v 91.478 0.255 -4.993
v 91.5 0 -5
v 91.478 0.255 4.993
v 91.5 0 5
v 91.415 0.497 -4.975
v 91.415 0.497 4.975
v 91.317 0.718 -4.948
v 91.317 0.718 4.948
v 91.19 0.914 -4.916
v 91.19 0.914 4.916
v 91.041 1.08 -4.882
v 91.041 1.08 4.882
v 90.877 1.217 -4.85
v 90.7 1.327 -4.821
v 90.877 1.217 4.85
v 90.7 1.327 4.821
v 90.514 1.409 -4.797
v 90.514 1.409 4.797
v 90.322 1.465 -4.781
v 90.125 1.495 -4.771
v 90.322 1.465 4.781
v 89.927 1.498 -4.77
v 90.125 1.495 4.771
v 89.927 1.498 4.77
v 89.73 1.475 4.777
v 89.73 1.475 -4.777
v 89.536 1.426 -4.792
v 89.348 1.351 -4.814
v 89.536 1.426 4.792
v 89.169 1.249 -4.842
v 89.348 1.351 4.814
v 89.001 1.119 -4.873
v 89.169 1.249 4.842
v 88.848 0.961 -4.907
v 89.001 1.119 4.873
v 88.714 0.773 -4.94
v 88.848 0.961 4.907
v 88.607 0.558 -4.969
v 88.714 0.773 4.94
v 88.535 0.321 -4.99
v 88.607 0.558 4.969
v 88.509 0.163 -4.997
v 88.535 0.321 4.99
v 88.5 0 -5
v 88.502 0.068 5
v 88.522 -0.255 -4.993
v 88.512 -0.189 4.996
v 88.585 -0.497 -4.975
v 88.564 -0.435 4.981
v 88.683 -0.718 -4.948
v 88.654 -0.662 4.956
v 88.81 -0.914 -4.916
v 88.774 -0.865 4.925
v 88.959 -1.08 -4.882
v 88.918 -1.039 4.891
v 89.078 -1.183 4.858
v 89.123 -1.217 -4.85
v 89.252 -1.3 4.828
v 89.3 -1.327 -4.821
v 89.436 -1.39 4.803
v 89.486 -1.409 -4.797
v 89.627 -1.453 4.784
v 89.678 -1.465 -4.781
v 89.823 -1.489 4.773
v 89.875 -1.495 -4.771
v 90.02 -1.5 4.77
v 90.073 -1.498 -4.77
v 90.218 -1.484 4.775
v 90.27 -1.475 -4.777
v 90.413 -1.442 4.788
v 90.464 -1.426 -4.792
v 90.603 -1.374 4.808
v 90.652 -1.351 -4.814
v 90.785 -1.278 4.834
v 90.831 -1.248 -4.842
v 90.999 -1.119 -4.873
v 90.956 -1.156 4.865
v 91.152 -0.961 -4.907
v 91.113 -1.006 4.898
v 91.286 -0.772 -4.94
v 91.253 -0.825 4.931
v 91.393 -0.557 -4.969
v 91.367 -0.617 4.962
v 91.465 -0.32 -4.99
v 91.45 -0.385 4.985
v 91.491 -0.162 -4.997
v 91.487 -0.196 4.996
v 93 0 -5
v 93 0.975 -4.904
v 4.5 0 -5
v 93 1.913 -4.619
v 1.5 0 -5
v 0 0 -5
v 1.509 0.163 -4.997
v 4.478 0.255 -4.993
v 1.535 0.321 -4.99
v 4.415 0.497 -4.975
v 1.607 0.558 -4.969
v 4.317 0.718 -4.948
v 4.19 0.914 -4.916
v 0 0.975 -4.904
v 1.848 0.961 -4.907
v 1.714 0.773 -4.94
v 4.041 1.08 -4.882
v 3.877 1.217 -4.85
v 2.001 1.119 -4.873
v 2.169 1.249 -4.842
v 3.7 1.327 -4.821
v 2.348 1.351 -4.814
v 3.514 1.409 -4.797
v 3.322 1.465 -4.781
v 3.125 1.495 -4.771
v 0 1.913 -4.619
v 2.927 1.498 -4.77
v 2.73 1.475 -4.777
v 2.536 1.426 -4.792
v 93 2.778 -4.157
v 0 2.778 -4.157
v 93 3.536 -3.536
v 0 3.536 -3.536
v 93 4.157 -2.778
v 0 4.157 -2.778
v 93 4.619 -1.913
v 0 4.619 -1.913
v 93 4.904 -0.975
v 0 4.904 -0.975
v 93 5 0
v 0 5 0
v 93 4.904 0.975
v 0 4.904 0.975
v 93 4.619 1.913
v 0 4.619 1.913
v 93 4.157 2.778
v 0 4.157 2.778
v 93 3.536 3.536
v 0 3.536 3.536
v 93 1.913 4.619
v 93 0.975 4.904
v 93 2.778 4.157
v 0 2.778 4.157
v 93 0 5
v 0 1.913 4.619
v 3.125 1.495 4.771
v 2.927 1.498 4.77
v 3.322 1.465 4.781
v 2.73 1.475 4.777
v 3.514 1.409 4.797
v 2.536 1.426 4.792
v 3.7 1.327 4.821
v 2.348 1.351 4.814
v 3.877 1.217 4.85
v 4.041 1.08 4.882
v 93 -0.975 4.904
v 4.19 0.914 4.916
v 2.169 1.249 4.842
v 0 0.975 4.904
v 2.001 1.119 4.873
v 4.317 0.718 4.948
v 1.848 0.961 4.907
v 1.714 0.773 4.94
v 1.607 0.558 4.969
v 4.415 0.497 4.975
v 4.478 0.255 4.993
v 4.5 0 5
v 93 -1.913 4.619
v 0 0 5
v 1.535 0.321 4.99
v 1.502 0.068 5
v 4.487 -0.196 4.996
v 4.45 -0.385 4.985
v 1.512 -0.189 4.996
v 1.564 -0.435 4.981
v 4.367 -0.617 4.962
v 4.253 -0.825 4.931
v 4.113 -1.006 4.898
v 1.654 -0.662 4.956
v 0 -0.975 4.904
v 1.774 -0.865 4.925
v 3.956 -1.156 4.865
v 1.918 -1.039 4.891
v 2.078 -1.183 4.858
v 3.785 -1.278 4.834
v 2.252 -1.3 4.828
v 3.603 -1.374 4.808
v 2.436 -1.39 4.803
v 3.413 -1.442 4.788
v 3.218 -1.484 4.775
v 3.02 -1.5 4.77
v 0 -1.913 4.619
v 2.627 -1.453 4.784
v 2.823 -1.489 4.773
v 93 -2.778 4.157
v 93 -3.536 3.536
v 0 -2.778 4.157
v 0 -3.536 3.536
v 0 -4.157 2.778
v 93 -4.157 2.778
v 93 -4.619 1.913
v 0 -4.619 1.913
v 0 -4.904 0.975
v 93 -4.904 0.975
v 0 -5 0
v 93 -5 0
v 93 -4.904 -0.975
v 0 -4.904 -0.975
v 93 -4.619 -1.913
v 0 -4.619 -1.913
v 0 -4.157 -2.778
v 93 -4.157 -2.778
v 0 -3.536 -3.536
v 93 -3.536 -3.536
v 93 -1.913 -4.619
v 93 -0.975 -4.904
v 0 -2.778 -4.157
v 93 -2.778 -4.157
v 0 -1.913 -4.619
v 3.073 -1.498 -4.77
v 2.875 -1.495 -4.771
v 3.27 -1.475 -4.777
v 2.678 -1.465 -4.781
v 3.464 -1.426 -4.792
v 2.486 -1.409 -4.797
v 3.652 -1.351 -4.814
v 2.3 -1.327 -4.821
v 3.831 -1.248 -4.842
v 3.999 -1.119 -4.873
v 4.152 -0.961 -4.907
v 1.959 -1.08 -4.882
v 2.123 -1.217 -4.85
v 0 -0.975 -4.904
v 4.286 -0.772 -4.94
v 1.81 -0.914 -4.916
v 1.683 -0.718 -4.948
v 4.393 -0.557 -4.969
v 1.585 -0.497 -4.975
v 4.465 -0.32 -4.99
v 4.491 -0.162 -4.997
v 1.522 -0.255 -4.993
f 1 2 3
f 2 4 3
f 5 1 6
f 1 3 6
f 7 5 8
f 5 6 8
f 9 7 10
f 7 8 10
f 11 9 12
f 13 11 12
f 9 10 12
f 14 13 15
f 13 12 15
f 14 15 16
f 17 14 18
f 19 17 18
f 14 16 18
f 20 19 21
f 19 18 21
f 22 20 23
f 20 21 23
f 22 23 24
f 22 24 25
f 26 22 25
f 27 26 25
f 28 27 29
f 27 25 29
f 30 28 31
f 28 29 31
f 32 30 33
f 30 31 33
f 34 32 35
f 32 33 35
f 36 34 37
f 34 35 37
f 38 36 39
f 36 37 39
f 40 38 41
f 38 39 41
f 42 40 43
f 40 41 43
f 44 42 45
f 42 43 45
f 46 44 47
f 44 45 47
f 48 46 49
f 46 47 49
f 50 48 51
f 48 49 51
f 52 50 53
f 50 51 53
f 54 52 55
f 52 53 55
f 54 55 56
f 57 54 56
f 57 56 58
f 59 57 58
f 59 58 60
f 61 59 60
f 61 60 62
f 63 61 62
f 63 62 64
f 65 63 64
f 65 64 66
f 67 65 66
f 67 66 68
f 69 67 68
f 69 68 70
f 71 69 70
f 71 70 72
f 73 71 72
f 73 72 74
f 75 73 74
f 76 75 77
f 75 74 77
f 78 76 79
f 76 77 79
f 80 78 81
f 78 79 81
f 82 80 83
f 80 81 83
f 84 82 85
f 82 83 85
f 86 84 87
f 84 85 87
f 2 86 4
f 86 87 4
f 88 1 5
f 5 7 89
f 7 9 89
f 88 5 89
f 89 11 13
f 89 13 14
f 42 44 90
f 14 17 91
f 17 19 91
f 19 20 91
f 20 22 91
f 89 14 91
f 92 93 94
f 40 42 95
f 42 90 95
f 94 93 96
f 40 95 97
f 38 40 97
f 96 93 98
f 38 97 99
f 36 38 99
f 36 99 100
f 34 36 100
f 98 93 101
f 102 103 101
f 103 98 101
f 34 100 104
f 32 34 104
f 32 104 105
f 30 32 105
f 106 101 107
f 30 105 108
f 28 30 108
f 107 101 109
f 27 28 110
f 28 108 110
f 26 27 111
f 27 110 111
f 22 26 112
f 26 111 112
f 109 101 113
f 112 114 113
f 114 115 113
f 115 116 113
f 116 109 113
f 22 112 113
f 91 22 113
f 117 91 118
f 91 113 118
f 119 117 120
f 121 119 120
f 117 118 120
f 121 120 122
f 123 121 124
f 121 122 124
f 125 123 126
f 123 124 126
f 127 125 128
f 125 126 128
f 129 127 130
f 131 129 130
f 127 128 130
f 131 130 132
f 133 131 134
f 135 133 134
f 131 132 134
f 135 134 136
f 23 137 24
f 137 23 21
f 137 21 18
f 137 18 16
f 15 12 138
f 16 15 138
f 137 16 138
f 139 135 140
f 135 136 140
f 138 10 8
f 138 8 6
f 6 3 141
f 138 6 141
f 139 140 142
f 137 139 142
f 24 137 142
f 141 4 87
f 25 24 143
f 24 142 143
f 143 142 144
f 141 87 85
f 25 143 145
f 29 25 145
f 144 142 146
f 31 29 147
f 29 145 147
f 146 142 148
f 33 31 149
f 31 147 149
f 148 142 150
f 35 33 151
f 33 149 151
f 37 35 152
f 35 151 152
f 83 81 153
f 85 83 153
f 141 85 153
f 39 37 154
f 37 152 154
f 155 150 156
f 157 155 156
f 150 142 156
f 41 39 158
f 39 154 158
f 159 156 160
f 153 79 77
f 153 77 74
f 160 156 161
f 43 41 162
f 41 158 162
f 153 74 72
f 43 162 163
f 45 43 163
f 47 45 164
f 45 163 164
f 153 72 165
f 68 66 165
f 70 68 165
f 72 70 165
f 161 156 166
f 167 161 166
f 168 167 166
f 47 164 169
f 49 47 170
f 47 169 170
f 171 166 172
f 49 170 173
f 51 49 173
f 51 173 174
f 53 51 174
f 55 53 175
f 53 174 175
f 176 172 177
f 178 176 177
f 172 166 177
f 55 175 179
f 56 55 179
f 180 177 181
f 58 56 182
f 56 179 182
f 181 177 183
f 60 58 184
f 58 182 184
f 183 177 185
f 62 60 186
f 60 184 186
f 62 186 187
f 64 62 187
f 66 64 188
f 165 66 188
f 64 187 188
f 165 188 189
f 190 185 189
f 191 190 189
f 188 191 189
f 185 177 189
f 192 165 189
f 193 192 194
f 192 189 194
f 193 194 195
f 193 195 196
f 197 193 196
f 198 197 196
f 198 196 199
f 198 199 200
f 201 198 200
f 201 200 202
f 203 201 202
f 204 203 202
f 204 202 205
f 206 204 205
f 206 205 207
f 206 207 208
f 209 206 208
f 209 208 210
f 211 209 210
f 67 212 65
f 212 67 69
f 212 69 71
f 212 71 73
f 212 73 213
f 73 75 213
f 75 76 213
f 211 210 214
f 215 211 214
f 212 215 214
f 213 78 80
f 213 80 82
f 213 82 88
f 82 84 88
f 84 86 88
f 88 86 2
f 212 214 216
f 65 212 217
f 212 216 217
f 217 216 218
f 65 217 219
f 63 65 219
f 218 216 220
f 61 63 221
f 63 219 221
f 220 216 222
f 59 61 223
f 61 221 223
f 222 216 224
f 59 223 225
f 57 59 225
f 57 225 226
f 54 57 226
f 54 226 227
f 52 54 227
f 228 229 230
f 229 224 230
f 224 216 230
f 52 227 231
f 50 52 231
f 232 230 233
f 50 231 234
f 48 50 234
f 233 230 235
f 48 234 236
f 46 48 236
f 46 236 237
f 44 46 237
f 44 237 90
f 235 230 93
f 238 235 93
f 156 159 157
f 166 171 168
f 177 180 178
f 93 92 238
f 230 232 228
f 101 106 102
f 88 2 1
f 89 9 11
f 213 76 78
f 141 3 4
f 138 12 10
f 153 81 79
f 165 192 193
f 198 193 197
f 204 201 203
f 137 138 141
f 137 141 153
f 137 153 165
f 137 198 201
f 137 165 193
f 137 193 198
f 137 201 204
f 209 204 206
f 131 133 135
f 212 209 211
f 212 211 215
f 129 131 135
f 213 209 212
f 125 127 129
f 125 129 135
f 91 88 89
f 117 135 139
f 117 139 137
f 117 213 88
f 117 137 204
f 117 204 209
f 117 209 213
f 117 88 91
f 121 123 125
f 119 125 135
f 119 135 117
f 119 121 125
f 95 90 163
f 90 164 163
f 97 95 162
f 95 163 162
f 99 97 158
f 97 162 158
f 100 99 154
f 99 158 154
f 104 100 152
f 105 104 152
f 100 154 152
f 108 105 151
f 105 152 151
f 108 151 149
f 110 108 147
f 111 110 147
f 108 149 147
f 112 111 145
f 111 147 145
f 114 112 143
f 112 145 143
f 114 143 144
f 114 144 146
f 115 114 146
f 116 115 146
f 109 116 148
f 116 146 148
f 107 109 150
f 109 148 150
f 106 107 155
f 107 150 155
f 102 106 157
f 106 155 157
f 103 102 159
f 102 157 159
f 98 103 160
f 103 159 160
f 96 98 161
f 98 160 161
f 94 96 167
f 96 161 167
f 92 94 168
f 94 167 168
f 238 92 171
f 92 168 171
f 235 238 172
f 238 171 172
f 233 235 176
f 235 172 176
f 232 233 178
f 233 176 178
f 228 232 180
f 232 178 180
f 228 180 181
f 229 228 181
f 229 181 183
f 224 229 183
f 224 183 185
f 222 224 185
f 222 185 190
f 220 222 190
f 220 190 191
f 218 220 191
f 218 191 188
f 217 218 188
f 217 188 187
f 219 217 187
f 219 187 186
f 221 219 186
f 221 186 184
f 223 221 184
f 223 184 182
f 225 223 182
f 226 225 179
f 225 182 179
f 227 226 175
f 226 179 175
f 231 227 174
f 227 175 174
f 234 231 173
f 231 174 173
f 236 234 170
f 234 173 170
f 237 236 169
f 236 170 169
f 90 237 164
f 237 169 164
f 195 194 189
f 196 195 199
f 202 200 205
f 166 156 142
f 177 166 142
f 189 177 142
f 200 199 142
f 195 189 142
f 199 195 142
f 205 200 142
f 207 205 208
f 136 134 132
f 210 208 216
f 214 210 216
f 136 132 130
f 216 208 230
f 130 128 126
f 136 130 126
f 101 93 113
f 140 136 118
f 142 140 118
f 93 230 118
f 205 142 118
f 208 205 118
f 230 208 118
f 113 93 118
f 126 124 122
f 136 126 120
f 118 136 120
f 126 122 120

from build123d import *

# Parameters (mm, degrees)
CROQUIS1_R                        = 5
SALIENTE_EXTRUIR1_DEPTH           = 93
CORTAR_EXTRUIR1_REACH             = 7
CROQUIS2_R                        = 1.5
CORTAR_EXTRUIR1_DIRECTION_2_REACH = 7


with BuildPart() as part:
    # Croquis1 → Saliente-Extruir1 (new body)
    with BuildSketch(Plane(origin=(0, 0, 0), x_dir=(0, 0, -1), z_dir=(1, 0, 0))):
        Circle(CROQUIS1_R)
    extrude(amount=SALIENTE_EXTRUIR1_DEPTH)

    # Croquis2 → Cortar-Extruir1 (cut, up to next)
    with BuildSketch(Plane.XY, mode=Mode.PRIVATE) as cortar_extruir1_sk1:
        with Locations((3, 0)):
            Circle(CROQUIS2_R)
    cortar_extruir1_tool1 = extrude(cortar_extruir1_sk1.sketch, amount=-CORTAR_EXTRUIR1_REACH, mode=Mode.PRIVATE) & part.part
    add(cortar_extruir1_tool1.solids().sort_by_distance((3, 0, 0))[0], mode=Mode.SUBTRACT)
    # Croquis2 → Cortar-Extruir1 (cut, up to next)
    with BuildSketch(Plane.XY, mode=Mode.PRIVATE) as cortar_extruir1_sk2:
        with Locations((90, 0)):
            Circle(CROQUIS2_R)
    cortar_extruir1_tool2 = extrude(cortar_extruir1_sk2.sketch, amount=-CORTAR_EXTRUIR1_REACH, mode=Mode.PRIVATE) & part.part
    add(cortar_extruir1_tool2.solids().sort_by_distance((90, 0, 0))[0], mode=Mode.SUBTRACT)

    # Croquis2 → Cortar-Extruir1 direction 2 (cut, up to next)
    with BuildSketch(Plane.XY, mode=Mode.PRIVATE) as cortar_extruir1_direction_2_sk1:
        with Locations((3, 0)):
            Circle(CROQUIS2_R)
    cortar_extruir1_direction_2_tool1 = extrude(cortar_extruir1_direction_2_sk1.sketch, amount=CORTAR_EXTRUIR1_DIRECTION_2_REACH, mode=Mode.PRIVATE) & part.part
    add(cortar_extruir1_direction_2_tool1.solids().sort_by_distance((3, 0, 0))[0], mode=Mode.SUBTRACT)
    # Croquis2 → Cortar-Extruir1 direction 2 (cut, up to next)
    with BuildSketch(Plane.XY, mode=Mode.PRIVATE) as cortar_extruir1_direction_2_sk2:
        with Locations((90, 0)):
            Circle(CROQUIS2_R)
    cortar_extruir1_direction_2_tool2 = extrude(cortar_extruir1_direction_2_sk2.sketch, amount=CORTAR_EXTRUIR1_DIRECTION_2_REACH, mode=Mode.PRIVATE) & part.part
    add(cortar_extruir1_direction_2_tool2.solids().sort_by_distance((90, 0, 0))[0], mode=Mode.SUBTRACT)


solid = part.part
